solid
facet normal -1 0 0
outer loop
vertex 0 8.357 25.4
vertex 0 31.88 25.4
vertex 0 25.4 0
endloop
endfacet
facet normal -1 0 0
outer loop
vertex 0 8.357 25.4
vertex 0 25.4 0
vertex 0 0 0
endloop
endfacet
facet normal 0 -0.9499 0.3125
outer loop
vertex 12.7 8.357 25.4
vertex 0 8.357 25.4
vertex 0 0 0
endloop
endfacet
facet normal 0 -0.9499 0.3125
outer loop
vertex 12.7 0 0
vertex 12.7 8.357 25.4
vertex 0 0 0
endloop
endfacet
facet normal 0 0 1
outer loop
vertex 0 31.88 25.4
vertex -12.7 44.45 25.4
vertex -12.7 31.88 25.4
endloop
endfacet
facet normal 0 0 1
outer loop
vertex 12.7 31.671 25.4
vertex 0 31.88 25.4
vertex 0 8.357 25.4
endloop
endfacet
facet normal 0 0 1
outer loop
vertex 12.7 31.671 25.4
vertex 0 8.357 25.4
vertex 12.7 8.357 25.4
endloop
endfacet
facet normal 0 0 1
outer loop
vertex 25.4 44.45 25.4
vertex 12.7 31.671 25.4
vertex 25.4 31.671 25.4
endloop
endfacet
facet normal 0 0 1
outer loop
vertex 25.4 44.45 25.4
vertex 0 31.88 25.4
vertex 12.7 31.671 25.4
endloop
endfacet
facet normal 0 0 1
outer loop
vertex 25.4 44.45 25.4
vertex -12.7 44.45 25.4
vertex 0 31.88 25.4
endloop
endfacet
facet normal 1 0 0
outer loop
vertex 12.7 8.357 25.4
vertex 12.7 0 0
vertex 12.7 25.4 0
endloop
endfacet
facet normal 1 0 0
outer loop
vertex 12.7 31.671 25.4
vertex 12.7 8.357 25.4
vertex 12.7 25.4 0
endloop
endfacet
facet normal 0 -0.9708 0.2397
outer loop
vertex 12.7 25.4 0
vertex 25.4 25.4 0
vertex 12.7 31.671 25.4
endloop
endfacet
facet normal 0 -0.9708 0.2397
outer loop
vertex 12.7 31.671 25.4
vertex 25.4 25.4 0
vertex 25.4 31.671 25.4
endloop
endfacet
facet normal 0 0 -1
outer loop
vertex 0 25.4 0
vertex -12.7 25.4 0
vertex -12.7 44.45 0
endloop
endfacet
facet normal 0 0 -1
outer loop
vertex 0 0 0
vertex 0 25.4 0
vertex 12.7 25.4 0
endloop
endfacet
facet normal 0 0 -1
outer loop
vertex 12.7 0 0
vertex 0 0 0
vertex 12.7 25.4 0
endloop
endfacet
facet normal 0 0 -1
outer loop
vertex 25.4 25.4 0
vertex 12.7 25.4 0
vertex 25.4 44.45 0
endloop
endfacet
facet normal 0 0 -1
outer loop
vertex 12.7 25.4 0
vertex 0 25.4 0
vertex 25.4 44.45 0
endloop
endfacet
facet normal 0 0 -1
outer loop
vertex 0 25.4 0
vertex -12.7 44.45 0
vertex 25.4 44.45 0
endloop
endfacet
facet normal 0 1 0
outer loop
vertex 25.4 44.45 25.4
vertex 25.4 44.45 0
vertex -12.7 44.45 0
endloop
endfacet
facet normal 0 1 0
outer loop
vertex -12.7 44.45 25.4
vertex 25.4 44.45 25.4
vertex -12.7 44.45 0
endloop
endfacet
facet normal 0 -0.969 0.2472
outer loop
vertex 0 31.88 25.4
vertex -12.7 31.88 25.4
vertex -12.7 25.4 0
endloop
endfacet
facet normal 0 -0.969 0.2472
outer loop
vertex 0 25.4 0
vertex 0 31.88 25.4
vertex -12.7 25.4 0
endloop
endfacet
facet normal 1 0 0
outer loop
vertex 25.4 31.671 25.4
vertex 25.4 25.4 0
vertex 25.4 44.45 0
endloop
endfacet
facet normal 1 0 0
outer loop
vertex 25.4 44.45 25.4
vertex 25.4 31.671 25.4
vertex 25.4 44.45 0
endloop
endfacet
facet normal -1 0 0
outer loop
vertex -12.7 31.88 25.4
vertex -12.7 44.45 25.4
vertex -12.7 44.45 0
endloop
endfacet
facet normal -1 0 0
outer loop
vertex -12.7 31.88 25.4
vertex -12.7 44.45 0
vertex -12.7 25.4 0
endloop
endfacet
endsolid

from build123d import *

# Parameters (mm, degrees)
F1_DEPTH = 25.4
F3_DEPTH = 25.4
F6_DEPTH = 12.7
F7_DEPTH = 12.7


with BuildPart() as f1:
    # F0 (on Top) → F1 (new body)
    with BuildSketch(Plane.XY):
        Polygon((0, 25.4), (0, 0), (12.7, 0), (12.7, 25.4), (25.4, 25.4), (25.4, 44.45), (-12.7, 44.45), (-12.7, 25.4), align=None)
    extrude(amount=F1_DEPTH)

    # F2 (on face) → F3 (cut)
    with BuildSketch(Plane(origin=(0, 0, 0), x_dir=(0, -1, 0), z_dir=(-1, 0, 0))):
        Polygon((-8.356945, 25.4), (0, 0), (0, 25.4), align=None)
    extrude(amount=-F3_DEPTH, mode=Mode.SUBTRACT)

    # F5 (on face) → F6 (cut)
    with BuildSketch(Plane.YZ.offset(25.4)):
        Polygon((25.4, 0), (31.670947, 25.4), (25.4, 25.4), align=None)
    extrude(amount=-F6_DEPTH, mode=Mode.SUBTRACT)

    # F4 (on face) → F7 (cut)
    with BuildSketch(Plane(origin=(-12.7, 0, 0), x_dir=(0, -1, 0), z_dir=(-1, 0, 0))):
        Polygon((-31.880192, 25.4), (-25.4, 0), (-25.4, 25.4), align=None)
    extrude(amount=-F7_DEPTH, mode=Mode.SUBTRACT)


solid = f1.part
